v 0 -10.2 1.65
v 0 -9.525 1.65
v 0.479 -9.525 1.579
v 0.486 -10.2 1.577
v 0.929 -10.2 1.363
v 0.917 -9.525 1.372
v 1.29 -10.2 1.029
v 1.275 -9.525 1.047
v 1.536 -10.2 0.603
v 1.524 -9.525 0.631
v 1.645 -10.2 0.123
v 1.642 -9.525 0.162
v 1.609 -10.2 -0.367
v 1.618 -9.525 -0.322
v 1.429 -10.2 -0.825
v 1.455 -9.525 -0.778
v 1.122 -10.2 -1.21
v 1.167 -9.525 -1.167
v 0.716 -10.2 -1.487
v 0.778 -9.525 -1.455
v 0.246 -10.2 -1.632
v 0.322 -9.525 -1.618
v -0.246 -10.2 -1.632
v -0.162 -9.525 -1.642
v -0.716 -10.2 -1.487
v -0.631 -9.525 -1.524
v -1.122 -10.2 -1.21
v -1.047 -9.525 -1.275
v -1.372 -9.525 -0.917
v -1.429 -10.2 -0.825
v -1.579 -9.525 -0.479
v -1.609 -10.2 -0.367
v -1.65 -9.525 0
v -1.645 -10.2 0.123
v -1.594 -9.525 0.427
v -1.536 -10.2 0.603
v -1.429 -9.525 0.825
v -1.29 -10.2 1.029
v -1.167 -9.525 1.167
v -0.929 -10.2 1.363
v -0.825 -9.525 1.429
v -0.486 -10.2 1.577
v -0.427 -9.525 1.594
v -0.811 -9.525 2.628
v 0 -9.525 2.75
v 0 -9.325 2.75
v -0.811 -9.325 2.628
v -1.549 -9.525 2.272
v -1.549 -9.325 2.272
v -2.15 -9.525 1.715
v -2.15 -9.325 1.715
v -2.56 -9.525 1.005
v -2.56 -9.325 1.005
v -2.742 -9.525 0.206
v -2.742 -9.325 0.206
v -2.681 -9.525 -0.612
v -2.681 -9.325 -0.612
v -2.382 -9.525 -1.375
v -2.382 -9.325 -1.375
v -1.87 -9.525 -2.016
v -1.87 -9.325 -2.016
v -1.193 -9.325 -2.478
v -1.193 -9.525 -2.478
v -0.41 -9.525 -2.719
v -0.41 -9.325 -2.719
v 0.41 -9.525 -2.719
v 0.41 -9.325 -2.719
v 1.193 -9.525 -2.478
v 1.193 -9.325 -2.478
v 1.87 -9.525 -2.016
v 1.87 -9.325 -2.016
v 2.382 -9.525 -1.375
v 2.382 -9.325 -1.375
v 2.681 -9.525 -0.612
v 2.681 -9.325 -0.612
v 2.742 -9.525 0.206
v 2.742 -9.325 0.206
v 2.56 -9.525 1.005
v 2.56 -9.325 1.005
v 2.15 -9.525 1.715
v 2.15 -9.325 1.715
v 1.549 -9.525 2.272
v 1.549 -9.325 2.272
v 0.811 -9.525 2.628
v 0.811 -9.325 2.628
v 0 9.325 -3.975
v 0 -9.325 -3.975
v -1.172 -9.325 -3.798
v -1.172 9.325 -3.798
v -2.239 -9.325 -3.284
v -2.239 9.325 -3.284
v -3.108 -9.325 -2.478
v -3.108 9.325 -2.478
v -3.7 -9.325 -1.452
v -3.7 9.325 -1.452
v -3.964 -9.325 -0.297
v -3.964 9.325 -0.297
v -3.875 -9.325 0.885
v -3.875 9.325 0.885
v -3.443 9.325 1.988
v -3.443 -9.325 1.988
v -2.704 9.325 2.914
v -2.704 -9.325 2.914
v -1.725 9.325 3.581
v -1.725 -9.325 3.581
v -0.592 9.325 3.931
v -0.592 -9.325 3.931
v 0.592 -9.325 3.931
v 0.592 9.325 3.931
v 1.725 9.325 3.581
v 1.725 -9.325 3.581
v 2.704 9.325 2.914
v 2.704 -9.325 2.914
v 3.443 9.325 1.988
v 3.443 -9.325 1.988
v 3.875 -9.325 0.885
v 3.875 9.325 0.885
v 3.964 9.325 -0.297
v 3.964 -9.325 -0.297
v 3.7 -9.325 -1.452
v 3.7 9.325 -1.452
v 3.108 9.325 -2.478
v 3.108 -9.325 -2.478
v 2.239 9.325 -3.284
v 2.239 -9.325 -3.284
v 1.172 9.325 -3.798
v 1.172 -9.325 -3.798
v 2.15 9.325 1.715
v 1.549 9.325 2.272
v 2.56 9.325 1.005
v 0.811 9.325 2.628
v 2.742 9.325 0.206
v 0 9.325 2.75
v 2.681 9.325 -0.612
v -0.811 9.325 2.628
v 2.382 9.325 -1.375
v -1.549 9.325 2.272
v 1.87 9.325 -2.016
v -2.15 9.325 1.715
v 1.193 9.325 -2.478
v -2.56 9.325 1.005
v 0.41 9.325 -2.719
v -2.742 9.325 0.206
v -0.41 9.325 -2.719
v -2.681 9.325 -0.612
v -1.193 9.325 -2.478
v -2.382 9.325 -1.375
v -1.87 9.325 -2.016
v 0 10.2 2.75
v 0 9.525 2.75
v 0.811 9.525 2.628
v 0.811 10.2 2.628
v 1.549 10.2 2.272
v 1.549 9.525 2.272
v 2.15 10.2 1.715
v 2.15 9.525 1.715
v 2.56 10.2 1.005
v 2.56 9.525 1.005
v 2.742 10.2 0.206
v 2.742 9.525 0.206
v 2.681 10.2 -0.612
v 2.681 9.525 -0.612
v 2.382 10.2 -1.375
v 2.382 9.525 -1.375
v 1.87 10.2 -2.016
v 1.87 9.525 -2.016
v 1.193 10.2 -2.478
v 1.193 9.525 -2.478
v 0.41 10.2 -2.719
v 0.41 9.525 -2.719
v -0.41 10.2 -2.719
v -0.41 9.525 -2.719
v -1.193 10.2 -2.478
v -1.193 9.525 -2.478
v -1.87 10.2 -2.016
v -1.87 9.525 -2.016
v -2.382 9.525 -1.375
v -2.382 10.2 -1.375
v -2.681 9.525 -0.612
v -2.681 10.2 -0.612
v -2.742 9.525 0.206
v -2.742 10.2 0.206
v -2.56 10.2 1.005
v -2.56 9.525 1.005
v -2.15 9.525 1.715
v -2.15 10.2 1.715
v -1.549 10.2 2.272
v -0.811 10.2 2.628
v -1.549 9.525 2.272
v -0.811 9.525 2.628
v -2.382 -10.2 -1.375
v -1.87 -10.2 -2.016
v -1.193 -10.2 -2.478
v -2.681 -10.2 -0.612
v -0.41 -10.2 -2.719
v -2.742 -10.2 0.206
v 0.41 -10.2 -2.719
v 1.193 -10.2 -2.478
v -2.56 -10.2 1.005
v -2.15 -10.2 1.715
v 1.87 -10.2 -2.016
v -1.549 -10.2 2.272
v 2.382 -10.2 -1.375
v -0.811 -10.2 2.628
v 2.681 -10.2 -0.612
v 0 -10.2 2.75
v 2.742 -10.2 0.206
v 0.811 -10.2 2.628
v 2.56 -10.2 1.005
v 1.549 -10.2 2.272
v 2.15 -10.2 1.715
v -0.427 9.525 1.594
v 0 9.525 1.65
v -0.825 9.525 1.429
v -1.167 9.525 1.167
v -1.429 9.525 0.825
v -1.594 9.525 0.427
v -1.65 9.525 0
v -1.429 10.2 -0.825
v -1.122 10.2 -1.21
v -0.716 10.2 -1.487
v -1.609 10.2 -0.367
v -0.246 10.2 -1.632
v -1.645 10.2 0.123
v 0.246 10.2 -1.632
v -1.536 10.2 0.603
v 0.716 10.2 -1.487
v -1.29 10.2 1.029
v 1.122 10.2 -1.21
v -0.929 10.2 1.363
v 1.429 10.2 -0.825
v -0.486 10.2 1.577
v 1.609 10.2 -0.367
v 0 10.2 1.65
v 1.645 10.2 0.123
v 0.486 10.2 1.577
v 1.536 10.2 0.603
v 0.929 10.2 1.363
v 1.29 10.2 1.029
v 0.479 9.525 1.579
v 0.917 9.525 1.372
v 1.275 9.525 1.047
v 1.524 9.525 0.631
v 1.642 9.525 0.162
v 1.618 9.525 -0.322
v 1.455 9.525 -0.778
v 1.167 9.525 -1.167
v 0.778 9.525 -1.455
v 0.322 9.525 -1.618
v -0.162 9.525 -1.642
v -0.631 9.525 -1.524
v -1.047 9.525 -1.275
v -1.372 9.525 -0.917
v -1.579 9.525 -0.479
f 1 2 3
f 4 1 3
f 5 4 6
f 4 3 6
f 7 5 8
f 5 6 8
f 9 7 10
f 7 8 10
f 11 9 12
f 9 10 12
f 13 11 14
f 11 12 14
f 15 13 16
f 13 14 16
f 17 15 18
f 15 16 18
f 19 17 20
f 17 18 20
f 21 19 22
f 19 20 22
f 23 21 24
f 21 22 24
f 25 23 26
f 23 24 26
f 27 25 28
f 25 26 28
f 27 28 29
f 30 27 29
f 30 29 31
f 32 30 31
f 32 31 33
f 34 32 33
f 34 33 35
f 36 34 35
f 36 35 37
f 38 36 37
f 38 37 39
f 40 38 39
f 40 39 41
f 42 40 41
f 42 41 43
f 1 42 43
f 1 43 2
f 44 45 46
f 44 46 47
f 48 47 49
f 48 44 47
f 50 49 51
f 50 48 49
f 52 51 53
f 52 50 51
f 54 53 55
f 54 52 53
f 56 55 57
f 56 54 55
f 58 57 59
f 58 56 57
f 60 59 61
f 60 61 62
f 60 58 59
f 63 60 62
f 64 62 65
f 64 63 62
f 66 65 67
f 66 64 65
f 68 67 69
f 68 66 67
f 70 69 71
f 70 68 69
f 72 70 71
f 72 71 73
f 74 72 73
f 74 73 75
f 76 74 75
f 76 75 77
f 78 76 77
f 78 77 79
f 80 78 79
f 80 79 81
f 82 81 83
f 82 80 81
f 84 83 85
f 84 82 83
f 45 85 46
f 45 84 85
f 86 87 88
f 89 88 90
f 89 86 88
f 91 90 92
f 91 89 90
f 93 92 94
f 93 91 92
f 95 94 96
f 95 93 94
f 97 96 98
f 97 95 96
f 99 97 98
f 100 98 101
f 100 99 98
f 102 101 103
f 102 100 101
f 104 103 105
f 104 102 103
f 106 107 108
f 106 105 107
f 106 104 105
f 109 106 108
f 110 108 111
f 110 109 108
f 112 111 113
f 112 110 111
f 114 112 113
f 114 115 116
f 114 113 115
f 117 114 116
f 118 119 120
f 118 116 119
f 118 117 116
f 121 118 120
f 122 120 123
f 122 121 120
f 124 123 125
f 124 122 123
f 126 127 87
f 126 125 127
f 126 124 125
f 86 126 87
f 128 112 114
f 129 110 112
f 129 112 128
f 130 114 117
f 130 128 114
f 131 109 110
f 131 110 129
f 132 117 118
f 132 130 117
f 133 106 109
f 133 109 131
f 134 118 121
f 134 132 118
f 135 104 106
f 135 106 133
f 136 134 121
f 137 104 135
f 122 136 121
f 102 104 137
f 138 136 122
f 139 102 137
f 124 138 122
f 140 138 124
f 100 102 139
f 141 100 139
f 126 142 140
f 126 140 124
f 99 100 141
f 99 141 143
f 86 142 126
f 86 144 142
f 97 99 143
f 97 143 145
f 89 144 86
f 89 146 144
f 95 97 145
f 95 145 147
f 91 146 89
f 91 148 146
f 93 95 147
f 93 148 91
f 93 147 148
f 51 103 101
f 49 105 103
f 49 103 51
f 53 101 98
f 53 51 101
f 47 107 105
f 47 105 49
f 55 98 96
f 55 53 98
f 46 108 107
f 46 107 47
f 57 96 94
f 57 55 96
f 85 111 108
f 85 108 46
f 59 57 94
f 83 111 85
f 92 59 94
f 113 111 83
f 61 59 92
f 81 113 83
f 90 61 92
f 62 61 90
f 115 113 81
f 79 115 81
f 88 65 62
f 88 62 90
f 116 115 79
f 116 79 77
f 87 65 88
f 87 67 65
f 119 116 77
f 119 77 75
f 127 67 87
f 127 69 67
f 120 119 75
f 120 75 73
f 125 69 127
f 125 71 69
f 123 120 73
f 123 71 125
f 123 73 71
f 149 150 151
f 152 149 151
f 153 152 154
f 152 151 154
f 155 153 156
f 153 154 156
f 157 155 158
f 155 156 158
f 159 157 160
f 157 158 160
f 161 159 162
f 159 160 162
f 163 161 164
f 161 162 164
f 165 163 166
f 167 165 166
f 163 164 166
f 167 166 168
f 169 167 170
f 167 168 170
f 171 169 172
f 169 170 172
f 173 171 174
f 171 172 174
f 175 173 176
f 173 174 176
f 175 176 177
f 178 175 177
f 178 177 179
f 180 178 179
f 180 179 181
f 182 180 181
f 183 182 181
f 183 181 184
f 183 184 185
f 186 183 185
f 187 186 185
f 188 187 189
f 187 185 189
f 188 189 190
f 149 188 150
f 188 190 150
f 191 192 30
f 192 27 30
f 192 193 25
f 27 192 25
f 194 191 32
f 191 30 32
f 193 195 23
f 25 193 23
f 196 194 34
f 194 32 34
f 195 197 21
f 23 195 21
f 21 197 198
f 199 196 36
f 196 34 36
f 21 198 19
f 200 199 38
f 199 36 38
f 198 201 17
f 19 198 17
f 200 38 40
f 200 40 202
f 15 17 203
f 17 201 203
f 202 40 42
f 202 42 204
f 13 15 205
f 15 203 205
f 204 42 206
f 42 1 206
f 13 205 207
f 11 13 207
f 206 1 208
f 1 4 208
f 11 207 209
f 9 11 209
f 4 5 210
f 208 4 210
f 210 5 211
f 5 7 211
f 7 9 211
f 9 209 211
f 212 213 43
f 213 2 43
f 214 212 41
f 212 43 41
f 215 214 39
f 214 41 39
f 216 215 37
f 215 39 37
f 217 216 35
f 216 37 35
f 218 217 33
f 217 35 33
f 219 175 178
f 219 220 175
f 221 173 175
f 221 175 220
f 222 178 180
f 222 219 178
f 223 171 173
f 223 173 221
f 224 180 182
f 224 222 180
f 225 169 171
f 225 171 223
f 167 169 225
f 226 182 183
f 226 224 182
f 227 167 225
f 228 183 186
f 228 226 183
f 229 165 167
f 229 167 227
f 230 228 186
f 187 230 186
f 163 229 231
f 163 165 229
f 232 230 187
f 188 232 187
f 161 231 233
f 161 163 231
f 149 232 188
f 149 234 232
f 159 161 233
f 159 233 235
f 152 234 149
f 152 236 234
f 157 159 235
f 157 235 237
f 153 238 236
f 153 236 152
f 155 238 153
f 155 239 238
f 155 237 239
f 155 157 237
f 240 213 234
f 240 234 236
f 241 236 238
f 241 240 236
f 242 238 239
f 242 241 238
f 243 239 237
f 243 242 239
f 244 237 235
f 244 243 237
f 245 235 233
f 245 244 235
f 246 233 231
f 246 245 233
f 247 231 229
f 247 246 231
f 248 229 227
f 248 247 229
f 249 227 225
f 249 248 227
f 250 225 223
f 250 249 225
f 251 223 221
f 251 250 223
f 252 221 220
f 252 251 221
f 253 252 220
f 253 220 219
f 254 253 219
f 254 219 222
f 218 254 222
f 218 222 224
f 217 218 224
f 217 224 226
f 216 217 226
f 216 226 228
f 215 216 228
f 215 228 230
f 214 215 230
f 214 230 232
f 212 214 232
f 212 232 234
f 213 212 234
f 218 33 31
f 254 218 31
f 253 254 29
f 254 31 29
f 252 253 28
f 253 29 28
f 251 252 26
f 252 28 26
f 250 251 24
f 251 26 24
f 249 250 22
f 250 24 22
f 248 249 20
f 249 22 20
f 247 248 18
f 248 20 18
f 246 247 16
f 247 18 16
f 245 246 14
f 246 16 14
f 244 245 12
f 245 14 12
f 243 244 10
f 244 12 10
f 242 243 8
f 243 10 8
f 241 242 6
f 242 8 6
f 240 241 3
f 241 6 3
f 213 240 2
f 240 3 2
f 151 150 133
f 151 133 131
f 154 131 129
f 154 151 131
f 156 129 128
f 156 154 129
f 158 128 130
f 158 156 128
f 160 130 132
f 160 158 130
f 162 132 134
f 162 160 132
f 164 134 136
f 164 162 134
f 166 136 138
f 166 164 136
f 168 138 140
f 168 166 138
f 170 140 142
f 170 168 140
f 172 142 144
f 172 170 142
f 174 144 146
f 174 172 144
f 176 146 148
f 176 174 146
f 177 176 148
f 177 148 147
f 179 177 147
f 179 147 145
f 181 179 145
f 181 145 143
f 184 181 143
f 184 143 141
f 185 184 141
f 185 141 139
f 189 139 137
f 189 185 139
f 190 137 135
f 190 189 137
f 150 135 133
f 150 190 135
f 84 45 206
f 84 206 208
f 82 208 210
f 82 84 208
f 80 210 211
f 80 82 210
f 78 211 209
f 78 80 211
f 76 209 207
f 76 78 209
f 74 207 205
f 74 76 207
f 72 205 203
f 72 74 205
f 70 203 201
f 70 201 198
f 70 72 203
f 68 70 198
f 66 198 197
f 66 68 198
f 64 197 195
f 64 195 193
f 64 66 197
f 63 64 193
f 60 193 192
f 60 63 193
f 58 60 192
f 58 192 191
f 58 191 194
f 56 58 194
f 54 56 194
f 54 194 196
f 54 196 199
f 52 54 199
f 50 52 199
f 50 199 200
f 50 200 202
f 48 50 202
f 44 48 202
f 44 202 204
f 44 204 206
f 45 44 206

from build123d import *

# Parameters (mm, degrees)
SKETCH2_R                = 3.9751
BOSS_EXTRUDE1_DEPTH      = 9.525
M4X0_7_TAPPED_HOLE1_D    = 3.3
SKETCH5_R                = 2.75
SKETCH5_R_2              = 1.65
BOSS_EXTRUDE2_DEPTH      = 0.675
BOSS_EXTRUDE2_DEPTH_BACK = 19.725
SKETCH6_R                = 3.9751
SKETCH6_R_2              = 2.75
CUT_EXTRUDE1_DEPTH       = 0.2
SKETCH7_R                = 3.9751
SKETCH7_R_2              = 2.75
CUT_EXTRUDE2_DEPTH       = 0.2


with BuildPart() as part:
    # Sketch2 → Boss-Extrude1 (new, symmetric)
    with BuildSketch(Plane(origin=(0, 0, 0), x_dir=(1, 0, 0), z_dir=(0, 1, 0))):
        with Locations(Location((0, 0, 0), (0, 0, 90))):
            Circle(SKETCH2_R)
    extrude(amount=BOSS_EXTRUDE1_DEPTH, both=True)

    # M4x0.7 Tapped Hole1 (through all)
    with Locations(Plane(origin=(0, 9.525, 0), x_dir=(1, 0, 0), z_dir=(0, 1, 0))):
        with Locations((0, 0)):
            Hole(M4X0_7_TAPPED_HOLE1_D / 2)

    # Sketch5 → Boss-Extrude2 (add, two sides)
    with BuildSketch(Plane(origin=(0, 9.525, 0), x_dir=(1, 0, 0), z_dir=(0, 1, 0))) as boss_extrude2_sk:
        with Locations(Location((0, 0, 0), (0, 0, 270))):
            Circle(SKETCH5_R)
        with Locations(Location((0, 0, 0), (0, 0, 270))):
            Circle(SKETCH5_R_2, mode=Mode.SUBTRACT)
    extrude(amount=BOSS_EXTRUDE2_DEPTH)
    extrude(boss_extrude2_sk.sketch, amount=-BOSS_EXTRUDE2_DEPTH_BACK)

    # Sketch6 → Cut-Extrude1 (cut)
    with BuildSketch(Plane(origin=(0, 9.525, 0), x_dir=(1, 0, 0), z_dir=(0, 1, 0))):
        with Locations(Location((0, 0, 0), (0, 0, 90))):
            Circle(SKETCH6_R)
        with Locations(Location((0, 0, 0), (0, 0, 270))):
            Circle(SKETCH6_R_2, mode=Mode.SUBTRACT)
    extrude(amount=-CUT_EXTRUDE1_DEPTH, mode=Mode.SUBTRACT)

    # Sketch7 → Cut-Extrude2 (cut)
    with BuildSketch(Plane.XZ.offset(9.525)):
        with Locations(Location((0, 0, 0), (0, 0, 270))):
            Circle(SKETCH7_R)
        with Locations(Location((0, 0, 0), (0, 0, 90))):
            Circle(SKETCH7_R_2, mode=Mode.SUBTRACT)
    extrude(amount=-CUT_EXTRUDE2_DEPTH, mode=Mode.SUBTRACT)


solid = part.part
